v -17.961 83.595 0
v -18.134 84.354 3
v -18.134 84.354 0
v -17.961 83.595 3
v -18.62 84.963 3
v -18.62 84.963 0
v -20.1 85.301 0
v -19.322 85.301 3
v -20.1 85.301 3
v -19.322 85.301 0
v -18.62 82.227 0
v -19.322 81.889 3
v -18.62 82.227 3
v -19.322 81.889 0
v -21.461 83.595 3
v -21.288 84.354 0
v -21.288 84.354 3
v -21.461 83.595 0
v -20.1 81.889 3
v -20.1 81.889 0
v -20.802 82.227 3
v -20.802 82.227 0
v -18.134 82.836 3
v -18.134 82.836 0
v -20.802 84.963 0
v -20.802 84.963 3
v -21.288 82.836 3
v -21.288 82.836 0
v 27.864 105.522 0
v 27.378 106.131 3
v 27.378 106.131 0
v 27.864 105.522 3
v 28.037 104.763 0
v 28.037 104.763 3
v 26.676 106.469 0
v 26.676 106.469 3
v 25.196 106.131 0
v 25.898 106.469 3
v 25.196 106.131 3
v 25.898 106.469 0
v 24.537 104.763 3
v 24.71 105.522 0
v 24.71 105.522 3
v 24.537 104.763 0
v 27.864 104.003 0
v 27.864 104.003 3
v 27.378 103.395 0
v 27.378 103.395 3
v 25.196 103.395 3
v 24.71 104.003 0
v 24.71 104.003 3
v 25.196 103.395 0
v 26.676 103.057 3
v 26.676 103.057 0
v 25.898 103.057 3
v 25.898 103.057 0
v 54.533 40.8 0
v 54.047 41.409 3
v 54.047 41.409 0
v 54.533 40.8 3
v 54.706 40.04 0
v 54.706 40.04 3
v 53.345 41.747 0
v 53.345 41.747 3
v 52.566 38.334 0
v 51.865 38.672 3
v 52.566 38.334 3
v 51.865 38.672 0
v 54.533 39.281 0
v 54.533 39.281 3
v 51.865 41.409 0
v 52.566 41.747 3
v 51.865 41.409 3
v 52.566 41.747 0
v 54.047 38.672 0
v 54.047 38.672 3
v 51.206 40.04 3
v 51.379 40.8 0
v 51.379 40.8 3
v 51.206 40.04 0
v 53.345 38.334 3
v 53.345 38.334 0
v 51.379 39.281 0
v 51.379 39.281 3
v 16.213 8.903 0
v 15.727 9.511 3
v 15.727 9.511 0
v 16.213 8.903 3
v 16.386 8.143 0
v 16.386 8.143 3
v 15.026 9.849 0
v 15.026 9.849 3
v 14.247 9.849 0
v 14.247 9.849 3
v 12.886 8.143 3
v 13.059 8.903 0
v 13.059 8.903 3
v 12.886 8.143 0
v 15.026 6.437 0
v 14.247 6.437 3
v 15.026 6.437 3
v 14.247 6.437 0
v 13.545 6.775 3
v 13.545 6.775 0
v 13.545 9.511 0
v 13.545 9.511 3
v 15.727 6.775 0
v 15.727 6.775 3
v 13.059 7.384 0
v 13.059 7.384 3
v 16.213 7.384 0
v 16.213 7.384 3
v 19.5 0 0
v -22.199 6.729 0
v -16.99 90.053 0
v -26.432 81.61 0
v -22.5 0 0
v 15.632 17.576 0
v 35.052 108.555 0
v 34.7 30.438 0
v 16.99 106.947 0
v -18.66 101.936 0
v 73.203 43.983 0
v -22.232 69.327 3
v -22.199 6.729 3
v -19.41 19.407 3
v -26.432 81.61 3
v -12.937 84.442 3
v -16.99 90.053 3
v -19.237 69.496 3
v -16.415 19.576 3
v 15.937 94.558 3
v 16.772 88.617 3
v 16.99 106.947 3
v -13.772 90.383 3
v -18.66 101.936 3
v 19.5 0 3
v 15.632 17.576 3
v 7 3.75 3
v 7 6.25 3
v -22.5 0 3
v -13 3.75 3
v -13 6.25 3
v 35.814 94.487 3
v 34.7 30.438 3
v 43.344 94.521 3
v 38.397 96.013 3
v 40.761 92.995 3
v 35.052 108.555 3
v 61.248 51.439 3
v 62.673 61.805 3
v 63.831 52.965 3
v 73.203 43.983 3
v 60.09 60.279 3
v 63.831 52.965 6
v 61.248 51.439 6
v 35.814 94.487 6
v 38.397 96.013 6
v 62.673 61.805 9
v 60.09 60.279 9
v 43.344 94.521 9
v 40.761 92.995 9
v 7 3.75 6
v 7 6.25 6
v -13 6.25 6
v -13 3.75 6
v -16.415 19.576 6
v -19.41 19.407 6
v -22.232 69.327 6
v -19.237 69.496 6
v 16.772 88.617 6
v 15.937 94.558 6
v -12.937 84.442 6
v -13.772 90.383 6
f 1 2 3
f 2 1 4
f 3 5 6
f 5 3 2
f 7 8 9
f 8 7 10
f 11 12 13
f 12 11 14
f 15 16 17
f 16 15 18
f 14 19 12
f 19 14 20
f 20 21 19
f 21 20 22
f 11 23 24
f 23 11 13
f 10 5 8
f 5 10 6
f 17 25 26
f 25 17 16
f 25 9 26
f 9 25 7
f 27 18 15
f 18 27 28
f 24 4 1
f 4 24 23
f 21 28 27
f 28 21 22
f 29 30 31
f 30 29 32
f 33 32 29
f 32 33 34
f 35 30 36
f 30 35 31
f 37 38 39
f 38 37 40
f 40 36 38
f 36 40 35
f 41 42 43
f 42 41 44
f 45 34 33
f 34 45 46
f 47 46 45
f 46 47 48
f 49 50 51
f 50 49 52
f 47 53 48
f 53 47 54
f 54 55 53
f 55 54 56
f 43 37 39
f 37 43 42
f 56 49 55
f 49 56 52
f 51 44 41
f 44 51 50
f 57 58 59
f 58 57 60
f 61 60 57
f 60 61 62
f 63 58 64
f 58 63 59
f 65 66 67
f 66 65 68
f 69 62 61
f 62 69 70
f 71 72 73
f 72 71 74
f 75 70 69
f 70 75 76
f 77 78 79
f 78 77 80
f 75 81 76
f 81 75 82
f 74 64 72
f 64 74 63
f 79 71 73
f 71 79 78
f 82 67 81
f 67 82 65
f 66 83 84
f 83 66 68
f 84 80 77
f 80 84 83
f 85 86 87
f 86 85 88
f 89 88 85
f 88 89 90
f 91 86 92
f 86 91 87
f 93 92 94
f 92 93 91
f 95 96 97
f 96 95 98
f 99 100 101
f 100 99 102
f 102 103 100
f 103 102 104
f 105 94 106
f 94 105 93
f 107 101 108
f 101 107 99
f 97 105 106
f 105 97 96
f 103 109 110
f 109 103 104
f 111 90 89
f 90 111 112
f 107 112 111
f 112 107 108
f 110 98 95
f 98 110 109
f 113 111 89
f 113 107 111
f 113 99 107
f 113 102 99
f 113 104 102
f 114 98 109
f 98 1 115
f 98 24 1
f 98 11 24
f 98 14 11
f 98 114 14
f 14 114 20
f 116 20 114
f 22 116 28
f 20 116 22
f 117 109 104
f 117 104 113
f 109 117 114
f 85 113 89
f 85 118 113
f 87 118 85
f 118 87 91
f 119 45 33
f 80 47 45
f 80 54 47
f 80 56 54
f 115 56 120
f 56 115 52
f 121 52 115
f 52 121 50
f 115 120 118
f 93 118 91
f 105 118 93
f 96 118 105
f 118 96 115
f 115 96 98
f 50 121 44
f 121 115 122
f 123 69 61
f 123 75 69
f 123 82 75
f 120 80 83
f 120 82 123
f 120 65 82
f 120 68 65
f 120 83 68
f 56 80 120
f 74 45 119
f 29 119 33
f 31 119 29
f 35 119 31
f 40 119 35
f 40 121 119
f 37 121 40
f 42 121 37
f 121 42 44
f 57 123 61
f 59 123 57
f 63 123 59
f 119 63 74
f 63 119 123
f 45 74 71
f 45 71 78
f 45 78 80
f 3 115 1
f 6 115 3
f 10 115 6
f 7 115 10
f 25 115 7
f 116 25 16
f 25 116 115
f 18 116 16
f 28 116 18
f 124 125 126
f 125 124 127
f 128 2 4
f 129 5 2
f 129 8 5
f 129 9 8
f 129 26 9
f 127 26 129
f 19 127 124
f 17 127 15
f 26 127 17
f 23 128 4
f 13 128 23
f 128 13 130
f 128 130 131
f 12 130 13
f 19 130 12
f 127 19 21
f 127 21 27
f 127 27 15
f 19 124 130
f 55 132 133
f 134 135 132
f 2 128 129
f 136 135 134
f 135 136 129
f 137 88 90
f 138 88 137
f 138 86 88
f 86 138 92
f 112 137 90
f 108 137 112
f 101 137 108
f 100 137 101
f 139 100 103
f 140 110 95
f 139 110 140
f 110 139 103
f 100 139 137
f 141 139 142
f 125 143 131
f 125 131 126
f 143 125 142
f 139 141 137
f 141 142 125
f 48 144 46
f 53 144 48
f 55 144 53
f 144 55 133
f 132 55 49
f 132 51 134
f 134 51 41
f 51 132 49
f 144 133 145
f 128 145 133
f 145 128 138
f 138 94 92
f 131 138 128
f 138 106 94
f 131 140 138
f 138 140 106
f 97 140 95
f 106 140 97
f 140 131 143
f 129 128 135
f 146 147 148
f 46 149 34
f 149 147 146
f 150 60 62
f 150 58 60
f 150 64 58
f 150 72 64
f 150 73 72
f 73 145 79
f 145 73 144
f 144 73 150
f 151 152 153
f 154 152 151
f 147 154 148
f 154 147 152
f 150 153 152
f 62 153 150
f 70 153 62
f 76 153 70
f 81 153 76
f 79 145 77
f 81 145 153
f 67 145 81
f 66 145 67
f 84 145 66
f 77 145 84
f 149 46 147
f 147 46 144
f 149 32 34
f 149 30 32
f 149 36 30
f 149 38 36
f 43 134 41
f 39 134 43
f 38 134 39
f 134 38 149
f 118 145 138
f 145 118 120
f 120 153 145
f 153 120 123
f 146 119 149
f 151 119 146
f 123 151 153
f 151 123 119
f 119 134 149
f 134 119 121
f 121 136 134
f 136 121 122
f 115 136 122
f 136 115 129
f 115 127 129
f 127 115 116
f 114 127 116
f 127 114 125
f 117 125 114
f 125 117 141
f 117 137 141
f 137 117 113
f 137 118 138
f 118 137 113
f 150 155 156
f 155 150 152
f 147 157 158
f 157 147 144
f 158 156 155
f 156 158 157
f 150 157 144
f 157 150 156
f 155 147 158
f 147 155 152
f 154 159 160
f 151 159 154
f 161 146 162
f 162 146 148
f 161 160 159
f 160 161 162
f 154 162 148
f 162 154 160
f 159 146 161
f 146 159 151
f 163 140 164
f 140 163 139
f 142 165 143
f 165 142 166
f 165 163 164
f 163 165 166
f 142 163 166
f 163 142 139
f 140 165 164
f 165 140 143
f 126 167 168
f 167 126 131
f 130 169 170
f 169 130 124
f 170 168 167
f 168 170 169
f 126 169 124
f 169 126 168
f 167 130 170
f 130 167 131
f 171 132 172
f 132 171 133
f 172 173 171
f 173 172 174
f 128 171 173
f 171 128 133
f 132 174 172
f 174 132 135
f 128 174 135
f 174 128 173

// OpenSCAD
/*******************************
*  WheeTrometerBody-Calc-1
*  OpenSCAD program for generating body
*  and lid for WheeTrometer spectrometer
*  When lid = true, program generates lid
*  When lid is false, program generates body
*********************************/

  lid =true;  // when lid is true, the lid is generated

//  lid =false;  // when lid is false, the body is generated
/********************************
* adjustable variables, get these from OpticsCalc1 program
*  recommended visible parameters:
 GratPos = [-27.950, 4.5198];
 GratAngle = 161;
 Mirror1Pos = [20.4322, 37.4473];
 Mirror1Angle = -86.3085;
 CCDWallPos = [-34.1207, 54.3785];
 CCDAngle = 77.3194;

********************************/

/*GratPos = [-26.5885, 25.1586];
GratAngle = 136;
Mirror1Pos = [18.7462, 45.9926];
Mirror1Angle = 180+87.1395;
CCDWallPos = [-52.2968, 80.0835];
CCDAngle = 53.4107;  */

GratPos = [-25.1661, 24.0068];
GratAngle = 146;
Mirror1Pos = [22.818, 44.254];
Mirror1Angle = 86.7651;
CCDWallPos = [-52.8361, 75.5062];
CCDAngle = 59.4241;

SlitWallPos = [0,0];
SlitWallAngle = 0;
Mirror0Pos = [0,100];          // probably not good to change this
Mirror0Angle = -8;            // dont change this one either


/***************************************
*  End of adjustable Parameters    *
****************************************/

height = 31;      // interior wall height, for external dimension, add 2 x thickness
thickness = 3;

// positions for optical stuff

Posn = [[3+SlitWallPos[0],1.5+SlitWallPos[1],height/2+3],  
    // slit wall position, slit is actually at 0,0
        [Mirror0Pos[0], Mirror0Pos[1]-1.5,height/2+3],  // mirror 0
       // [Pos2[0],Pos2[1],height/2+3],  // grating
        [GratPos[0]+5*cos(GratAngle-90),GratPos[1]+5*sin(GratAngle-90),height/2+3],  // grating
        [Mirror1Pos[0],Mirror1Pos[1],height/2+3],   // mirror 1
        [CCDWallPos[0], CCDWallPos[1],height/2+3]]; // ccd
roughCalc = atan(Posn[2][0]/200);  // half the slit-mirror-grating angle  
Size = [[42,3,height],  //43 slit wall
        [36,12,height],  // mirror 0
        [23,10,height],  // grating
        [75,3,height],  // mirror 1
        [75,3,height]];  // ccd
Angle = [0,  // slit
        Mirror0Angle,  // mirror 1
        GratAngle,  // grating
 //       180+Mirror1Angle,
        Mirror1Angle,
        CCDAngle];  // ccd
         
ccdOffset = 3.2;
$fa = 6;  // make holes roundish
$fs = 0.8;

module fourHole(x, z, dia){   // method for creating four hole pattern
 //   xy = [1,-1];
for(a = [0:1],b=[0:1]){
  translate([x/2*xy[a],5,z/2*xy[b]])
    rotate([90,0,0])
   cylinder(30,d=dia,center = true);
}    
}
module wedge(l,h, angle){
    c = h/tan(angle);
    difference(){
        translate([0,c/2,h/2])
     cube([l,c,h],center = true);
     translate([0,c,0]) 
      rotate([angle,0,0])  
        cube([l+2,2*h*sin(angle),2*c*sin(angle)], center = true);
    }
}

holeDia = [2.5,3.5,6];  
xy = [+1,-1]; // used when multiple holes defined 
xShift = [-1.5,0,0,0,0];  // shift position of mirrors without affecting hole posns
// base polygon  ///
b00 = [Posn[0][0]+xShift[0]-Size[0][0]/2,Posn[0][1]-Size[0][1]/2];  // slit wall
b01 = [Posn[0][0]+xShift[0]+Size[0][0]/2,Posn[0][1]-Size[0][1]/2];
b10 = [Posn[1][0]-(Size[1][0]/2)*cos(Angle[1])+(Size[1][1]/2)*sin(Angle[1]),
        Posn[1][1]-(Size[1][0]/2)*sin(Angle[1])-(Size[1][1]/2)*cos(Angle[1])];
b11 =  [Posn[1][0]+(Size[1][0]/2)*cos(Angle[1])+(Size[1][1]/2)*sin(Angle[1]),
        Posn[1][1]+(Size[1][0]/2)*sin(Angle[1])-(Size[1][1]/2)*cos(Angle[1])];
b12 =  [Posn[1][0]-(Size[1][0]/2)*cos(Angle[1])-(Size[1][1]/2)*sin(Angle[1]),
        Posn[1][1]-(Size[1][0]/2)*sin(Angle[1])+(Size[1][1]/2)*cos(Angle[1])];
b13 =  [Posn[1][0]+(Size[1][0]/2)*cos(Angle[1])-(Size[1][1]/2)*sin(Angle[1]),
        Posn[1][1]+(Size[1][0]/2)*sin(Angle[1])+(Size[1][1]/2)*cos(Angle[1])];
b20 =  [Posn[2][0]+(Size[2][0]/2)*cos(Angle[2])-(Size[2][1]/2)*sin(Angle[2]),
        Posn[2][1]+(Size[2][0]/2)*sin(Angle[2])+(Size[2][1]/2)*cos(Angle[2])];
b21 =  [Posn[2][0]-(Size[2][0]/2)*cos(Angle[2])-(Size[2][1]/2)*sin(Angle[2]),
        Posn[2][1]-(Size[2][0]/2)*sin(Angle[2])+(Size[2][1]/2)*cos(Angle[2])];
b30 =  [Posn[3][0]-(Size[3][0]/2)*cos(Angle[3])+(Size[3][1]/2)*sin(Angle[3]),
        Posn[3][1]-(Size[3][0]/2)*sin(Angle[3])-(Size[3][1]/2)*cos(Angle[3])];
b31 =  [Posn[3][0]+(Size[3][0]/2)*cos(Angle[3])+(Size[3][1]/2)*sin(Angle[3]),
        Posn[3][1]+(Size[3][0]/2)*sin(Angle[3])-(Size[3][1]/2)*cos(Angle[3])];
b42 =  [Posn[4][0]-(Size[4][0]/2)*cos(Angle[4])-(Size[4][1]/2)*sin(Angle[4]),
        Posn[4][1]-(Size[4][0]/2)*sin(Angle[4])+(Size[4][1]/2)*cos(Angle[4])];
b43 =  [Posn[4][0]+(Size[4][0]/2)*cos(Angle[4])-(Size[4][1]/2)*sin(Angle[4]),
        Posn[4][1]+(Size[4][0]/2)*sin(Angle[4])+(Size[4][1]/2)*cos(Angle[4])];

    

thick = [6,6,6,6,6];          // wall thickness to accomodate screws

ConPts = [b01,b30,
         b31,b11,
         b12,b43,     //b10 changed to b12
         b42,b20,
         b21,b00];  // connection points  
if(lid == true){
    h0 = 3;  // height of rails
    th0 = 3;
    echo("lid = true");
    // rail along ccd wall
     rotate([0,180,0])
     translate([Posn[4][0],Posn[4][1],-th0-h0/2])  
    rotate(Angle[4])
    translate([0,-3.5,0])
    cube([50,3,h0],center = true); 
    
    rotate([0,180,0])
 //   translate([Posn[4][0],Posn[4][1],-Posn[4][2]])
    translate([Posn[4][0],Posn[4][1],-3])
    rotate(Angle[4])
    translate([ccdOffset-1,0,-3])
    cube([38,3,6], center = true);
    
  // rail along slit wall  
    rotate([0,180,0])
    translate ([3,5,-th0-h0/2])
    cube([20,2.5,h0],center = true);
    
/*    translate([-6,4.75,3])
    rotate([0,0,180])
    wedge(30,3,60); */
    
    // rail along mirror 2 wall
    rotate([0,180,0])
    translate([Posn[3][0],Posn[3][1],-th0-h0/2])  
    rotate(Angle[3])
    translate([0,3.5,0])
    cube([50,3,h0],center = true);
    
      // rail along mirror 1
    rotate([0,180,0])
    translate([Posn[1][0]-1.5,Posn[1][1]-9,-th0-h0/2])
    rotate(Angle[1])
    cube([30,6,h0], center = true);
    
        // fix problem with slit wall to grating wall connnection
  /*  rotate([0,180,0])
    translate([Posn[0][0],Posn[0][1],-1*thickness/2])
    rotate(Angle[0])
    cube([Size[0][0],Size[0][1],thickness],center = true);  
*/
 
  difference(){
    linear_extrude(height = th0, center= false)
    rotate([0,180,0])
    polygon(points = [b00,b01,b30,b31,b11,b13,b12,  //b10,
      b43,b42,b20,b21]); 
 //  holes   
   signVal = [1,-1,-1,1,-1];
  for(p=[0:4]){
   dx = ConPts[2*p][0]-ConPts[2*p+1][0];  // x distance between points
   dy = ConPts[2*p][1]-ConPts[2*p+1][1];;
   theta0 = atan(dy/dx);  //rotation angle
   d01 = sqrt((pow(dx,2)+pow(dy,2)));  // distance between points
   d04 = sqrt(pow(d01/2,2)+pow(thick[p]/2,2)); // distance to center
   gamma0 = theta0 + atan(thick[p]/d01);
       xPt0 = signVal[p]*d04*cos(gamma0);
       yPt0 = signVal[p]*d04*sin(gamma0);
  
   posn0 = [-1*ConPts[2*p][0]- xPt0,ConPts[2*p][1]+ yPt0,3];
      translate(posn0)
    //   translate([0,0,height/2-3])
      cylinder(100,d=holeDia[1],center = true);  // screw hole
    }  // end of lid mounting holes
  }
}  // end of lid

 
if(lid == false){
difference(){
     union(){

// create base

linear_extrude(height = 3, center= false)
polygon(points = [b00,b01,b30,b31,
         b11,b13,b12,  //b10,  // b10 removed for uv-vis
         b43,b42,b20,b21]); 
   // get points and angles for wall connections, 
  
//   signVal = [1,-1,-1,1];  // add versus subtract position
 /********************************************
 *   Wall Connectors
         note:  ConPts is before lid (line 122)
 ****************************************/
   flip = [180,180,180,0,180];
   extend = [0,4,4,0,3];
   move = [1,0,-4,2,-5];
   for(p=[0:4]){       // for each wall connector
   dx = ConPts[2*p][0]-ConPts[2*p+1][0];  // x distance between points
   dy = ConPts[2*p][1]-ConPts[2*p+1][1];;
   theta0 = atan(dy/dx);  //rotation angle
   d01 = sqrt((pow(dx,2)+pow(dy,2)));  // distance between points
       
   d04 = sqrt(pow(d01/2,2)+pow(thick[p]/2,2)); // distance to center
   gamma = theta0 + atan(thick[p]/d01);
  //     xPt = signVal[p]*d04*cos(gamma);
//       yPt = signVal[p]*d04*sin(gamma);
  
 //  posn = [ConPts[2*p][0]+ xPt,ConPts[2*p][1]+ yPt,3+height/2];
 posn = [ConPts[2*p][0],ConPts[2*p][1],3];
       translate(posn)
       rotate(theta0+flip[p])
       translate([move[p],0,0])
//       cube([d01,thick,height], center = true);  // connector
         cube([d01+extend[p],thick[p],height]);  // connector   
   }  // end of for loop
 
  for(a = [0:4]){
    translate([Posn[a][0]+xShift[a],Posn[a][1],Posn[a][2]])
    rotate(Angle[a])
    cube([Size[a][0],Size[a][1],Size[a][2]],center = true);
    }
//}
   /* translate([Posn[0][0],Posn[0][1],thickness/2])
    rotate(Angle[0])
    cube([Size[0][0],Size[0][1],thickness],center = true);  */
  //  translate([4,3,31])
 //   wedge(40,3,60);
    
}  // end of union
       //// mounting holes along x = 0 axis /////
  translate([0,20,2.5])
        cylinder(3.5,r1=1.5, r2 = 2.5,center = true);
translate([0,20,1.5])
        cylinder(3.5,d = holeDia[1],center = true);

   translate([0,80,2.5])
        cylinder(3.5,r1=1.5, r2 = 2.5,center = true); 
      translate([0,80,1.5])
        cylinder(3.5,d = holeDia[1],center = true); 

 // holes in slit wall
translate([0,0,height/2 + thickness])
rotate([90,0,0])
cylinder(14,d=10,center = true);

// holes for slit mounting screws
translate([0,0,height/2+thickness])
fourHole(24,20,holeDia[0]); // end of slit wall holes

///////// begin modifications for mirror 1
translate([Posn[1][0],Posn[1][1]+4,Posn[1][2]])
    rotate(Angle[1])
    cube([30,8,height+1], center = true); 
translate([Posn[1][0]-1.5,Posn[1][1]-9,Posn[1][2]])
    rotate(Angle[1])
    cube([30,7,height+1], center = true);

translate([Posn[1][0],Posn[1][1],Posn[1][2]])
    rotate(Angle[1])
    rotate([90,0,0])
    cylinder(20,d=18, center = true);
    // mounting screw holes
 
translate([Posn[1][0],Posn[1][1],Posn[1][2]])
   rotate(Angle[1])
fourHole(20,20,holeDia[0]); 
// end of mirror 1 modifications

  // begin modifications for grating
translate([Posn[2][0],Posn[2][1],Posn[2][2]])
    rotate(Angle[2])
    translate([0,-3,0])
    cube([17,8,height+2], center = true);
for (g = [0:1]){
translate([Posn[2][0],Posn[2][1],Posn[2][2]])
   rotate(Angle[2])
   translate([0,5,10*xy[g]])
   rotate([90,0,0])
   cylinder(14,d = holeDia[1], center = true);
translate([Posn[2][0],Posn[2][1],Posn[2][2]])
    rotate(Angle[2])
    translate([0,5,10*xy[g]])
    rotate([90,0,0])
    cylinder(2,d=holeDia[2],center = true);
}  // end of grating modification

    // begin focusing mirror holes
for (g = [0:1]){
translate([Posn[3][0],Posn[3][1],Posn[3][2]])
   rotate(Angle[3])
   translate([-28,-5,10*xy[g]])
   rotate([90,0,0])
   cylinder(14,d = holeDia[1], center = true);  // two holes 
translate([Posn[3][0],Posn[3][1],Posn[3][2]])
   rotate(Angle[3])
   translate([-28,-2,10*xy[g]])
   rotate([90,0,0])
   cylinder(3,d=holeDia[2],center = true);  // counter bore
}
translate([Posn[3][0],Posn[3][1],Posn[3][2]])
   rotate(Angle[3])
   translate([28,-5,0])
   rotate([90,0,0])
   cylinder(8,d=holeDia[2],center = true);  // counter bore
translate([Posn[3][0],Posn[3][1],Posn[3][2]])
   rotate(Angle[3])
   translate([28,-5,0])
   rotate([90,0,0])
   cylinder(14,d=holeDia[1],center = true);  // counter bore

//// begin ccd mods ////////
translate([Posn[4][0],Posn[4][1],Posn[4][2]])
    rotate(Angle[4])
    translate([ccdOffset-1,0,3])
    cube([39,4,height-4], center = true);

translate([Posn[4][0],Posn[4][1],Posn[4][2]])
   rotate(Angle[4])
   translate([ccdOffset,0,0])   // ccdOffset = -8
fourHole(53,18,holeDia[0]); 
// end of ccd modification

   // begin lid mounting holes
   signVal = [-1,-1,-1,1,-1];
for(p=[0:4]){
   dx = ConPts[2*p][0]-ConPts[2*p+1][0];  // x distance between points
   dy = ConPts[2*p][1]-ConPts[2*p+1][1];;
   theta0 = atan(dy/dx);  //rotation angle
   d01 = sqrt((pow(dx,2)+pow(dy,2)));  // distance between points
   d04 = sqrt(pow(d01/2,2)+pow(thick[p]/2,2)); // distance to center
   gamma = theta0 + atan(thick[p]/d01);
       xPt = signVal[p]*d04*cos(gamma);
       yPt = signVal[p]*d04*sin(gamma);
  
   posn = [ConPts[2*p][0]+ xPt,ConPts[2*p][1]+ yPt,3+height/2];
      translate(posn)
       translate([0,0,height/2-3])
      cylinder(10,d=holeDia[0],center = true);  // screw hole
}  // end of lid mounting holes
}
}  // end of if lid is false
//}
